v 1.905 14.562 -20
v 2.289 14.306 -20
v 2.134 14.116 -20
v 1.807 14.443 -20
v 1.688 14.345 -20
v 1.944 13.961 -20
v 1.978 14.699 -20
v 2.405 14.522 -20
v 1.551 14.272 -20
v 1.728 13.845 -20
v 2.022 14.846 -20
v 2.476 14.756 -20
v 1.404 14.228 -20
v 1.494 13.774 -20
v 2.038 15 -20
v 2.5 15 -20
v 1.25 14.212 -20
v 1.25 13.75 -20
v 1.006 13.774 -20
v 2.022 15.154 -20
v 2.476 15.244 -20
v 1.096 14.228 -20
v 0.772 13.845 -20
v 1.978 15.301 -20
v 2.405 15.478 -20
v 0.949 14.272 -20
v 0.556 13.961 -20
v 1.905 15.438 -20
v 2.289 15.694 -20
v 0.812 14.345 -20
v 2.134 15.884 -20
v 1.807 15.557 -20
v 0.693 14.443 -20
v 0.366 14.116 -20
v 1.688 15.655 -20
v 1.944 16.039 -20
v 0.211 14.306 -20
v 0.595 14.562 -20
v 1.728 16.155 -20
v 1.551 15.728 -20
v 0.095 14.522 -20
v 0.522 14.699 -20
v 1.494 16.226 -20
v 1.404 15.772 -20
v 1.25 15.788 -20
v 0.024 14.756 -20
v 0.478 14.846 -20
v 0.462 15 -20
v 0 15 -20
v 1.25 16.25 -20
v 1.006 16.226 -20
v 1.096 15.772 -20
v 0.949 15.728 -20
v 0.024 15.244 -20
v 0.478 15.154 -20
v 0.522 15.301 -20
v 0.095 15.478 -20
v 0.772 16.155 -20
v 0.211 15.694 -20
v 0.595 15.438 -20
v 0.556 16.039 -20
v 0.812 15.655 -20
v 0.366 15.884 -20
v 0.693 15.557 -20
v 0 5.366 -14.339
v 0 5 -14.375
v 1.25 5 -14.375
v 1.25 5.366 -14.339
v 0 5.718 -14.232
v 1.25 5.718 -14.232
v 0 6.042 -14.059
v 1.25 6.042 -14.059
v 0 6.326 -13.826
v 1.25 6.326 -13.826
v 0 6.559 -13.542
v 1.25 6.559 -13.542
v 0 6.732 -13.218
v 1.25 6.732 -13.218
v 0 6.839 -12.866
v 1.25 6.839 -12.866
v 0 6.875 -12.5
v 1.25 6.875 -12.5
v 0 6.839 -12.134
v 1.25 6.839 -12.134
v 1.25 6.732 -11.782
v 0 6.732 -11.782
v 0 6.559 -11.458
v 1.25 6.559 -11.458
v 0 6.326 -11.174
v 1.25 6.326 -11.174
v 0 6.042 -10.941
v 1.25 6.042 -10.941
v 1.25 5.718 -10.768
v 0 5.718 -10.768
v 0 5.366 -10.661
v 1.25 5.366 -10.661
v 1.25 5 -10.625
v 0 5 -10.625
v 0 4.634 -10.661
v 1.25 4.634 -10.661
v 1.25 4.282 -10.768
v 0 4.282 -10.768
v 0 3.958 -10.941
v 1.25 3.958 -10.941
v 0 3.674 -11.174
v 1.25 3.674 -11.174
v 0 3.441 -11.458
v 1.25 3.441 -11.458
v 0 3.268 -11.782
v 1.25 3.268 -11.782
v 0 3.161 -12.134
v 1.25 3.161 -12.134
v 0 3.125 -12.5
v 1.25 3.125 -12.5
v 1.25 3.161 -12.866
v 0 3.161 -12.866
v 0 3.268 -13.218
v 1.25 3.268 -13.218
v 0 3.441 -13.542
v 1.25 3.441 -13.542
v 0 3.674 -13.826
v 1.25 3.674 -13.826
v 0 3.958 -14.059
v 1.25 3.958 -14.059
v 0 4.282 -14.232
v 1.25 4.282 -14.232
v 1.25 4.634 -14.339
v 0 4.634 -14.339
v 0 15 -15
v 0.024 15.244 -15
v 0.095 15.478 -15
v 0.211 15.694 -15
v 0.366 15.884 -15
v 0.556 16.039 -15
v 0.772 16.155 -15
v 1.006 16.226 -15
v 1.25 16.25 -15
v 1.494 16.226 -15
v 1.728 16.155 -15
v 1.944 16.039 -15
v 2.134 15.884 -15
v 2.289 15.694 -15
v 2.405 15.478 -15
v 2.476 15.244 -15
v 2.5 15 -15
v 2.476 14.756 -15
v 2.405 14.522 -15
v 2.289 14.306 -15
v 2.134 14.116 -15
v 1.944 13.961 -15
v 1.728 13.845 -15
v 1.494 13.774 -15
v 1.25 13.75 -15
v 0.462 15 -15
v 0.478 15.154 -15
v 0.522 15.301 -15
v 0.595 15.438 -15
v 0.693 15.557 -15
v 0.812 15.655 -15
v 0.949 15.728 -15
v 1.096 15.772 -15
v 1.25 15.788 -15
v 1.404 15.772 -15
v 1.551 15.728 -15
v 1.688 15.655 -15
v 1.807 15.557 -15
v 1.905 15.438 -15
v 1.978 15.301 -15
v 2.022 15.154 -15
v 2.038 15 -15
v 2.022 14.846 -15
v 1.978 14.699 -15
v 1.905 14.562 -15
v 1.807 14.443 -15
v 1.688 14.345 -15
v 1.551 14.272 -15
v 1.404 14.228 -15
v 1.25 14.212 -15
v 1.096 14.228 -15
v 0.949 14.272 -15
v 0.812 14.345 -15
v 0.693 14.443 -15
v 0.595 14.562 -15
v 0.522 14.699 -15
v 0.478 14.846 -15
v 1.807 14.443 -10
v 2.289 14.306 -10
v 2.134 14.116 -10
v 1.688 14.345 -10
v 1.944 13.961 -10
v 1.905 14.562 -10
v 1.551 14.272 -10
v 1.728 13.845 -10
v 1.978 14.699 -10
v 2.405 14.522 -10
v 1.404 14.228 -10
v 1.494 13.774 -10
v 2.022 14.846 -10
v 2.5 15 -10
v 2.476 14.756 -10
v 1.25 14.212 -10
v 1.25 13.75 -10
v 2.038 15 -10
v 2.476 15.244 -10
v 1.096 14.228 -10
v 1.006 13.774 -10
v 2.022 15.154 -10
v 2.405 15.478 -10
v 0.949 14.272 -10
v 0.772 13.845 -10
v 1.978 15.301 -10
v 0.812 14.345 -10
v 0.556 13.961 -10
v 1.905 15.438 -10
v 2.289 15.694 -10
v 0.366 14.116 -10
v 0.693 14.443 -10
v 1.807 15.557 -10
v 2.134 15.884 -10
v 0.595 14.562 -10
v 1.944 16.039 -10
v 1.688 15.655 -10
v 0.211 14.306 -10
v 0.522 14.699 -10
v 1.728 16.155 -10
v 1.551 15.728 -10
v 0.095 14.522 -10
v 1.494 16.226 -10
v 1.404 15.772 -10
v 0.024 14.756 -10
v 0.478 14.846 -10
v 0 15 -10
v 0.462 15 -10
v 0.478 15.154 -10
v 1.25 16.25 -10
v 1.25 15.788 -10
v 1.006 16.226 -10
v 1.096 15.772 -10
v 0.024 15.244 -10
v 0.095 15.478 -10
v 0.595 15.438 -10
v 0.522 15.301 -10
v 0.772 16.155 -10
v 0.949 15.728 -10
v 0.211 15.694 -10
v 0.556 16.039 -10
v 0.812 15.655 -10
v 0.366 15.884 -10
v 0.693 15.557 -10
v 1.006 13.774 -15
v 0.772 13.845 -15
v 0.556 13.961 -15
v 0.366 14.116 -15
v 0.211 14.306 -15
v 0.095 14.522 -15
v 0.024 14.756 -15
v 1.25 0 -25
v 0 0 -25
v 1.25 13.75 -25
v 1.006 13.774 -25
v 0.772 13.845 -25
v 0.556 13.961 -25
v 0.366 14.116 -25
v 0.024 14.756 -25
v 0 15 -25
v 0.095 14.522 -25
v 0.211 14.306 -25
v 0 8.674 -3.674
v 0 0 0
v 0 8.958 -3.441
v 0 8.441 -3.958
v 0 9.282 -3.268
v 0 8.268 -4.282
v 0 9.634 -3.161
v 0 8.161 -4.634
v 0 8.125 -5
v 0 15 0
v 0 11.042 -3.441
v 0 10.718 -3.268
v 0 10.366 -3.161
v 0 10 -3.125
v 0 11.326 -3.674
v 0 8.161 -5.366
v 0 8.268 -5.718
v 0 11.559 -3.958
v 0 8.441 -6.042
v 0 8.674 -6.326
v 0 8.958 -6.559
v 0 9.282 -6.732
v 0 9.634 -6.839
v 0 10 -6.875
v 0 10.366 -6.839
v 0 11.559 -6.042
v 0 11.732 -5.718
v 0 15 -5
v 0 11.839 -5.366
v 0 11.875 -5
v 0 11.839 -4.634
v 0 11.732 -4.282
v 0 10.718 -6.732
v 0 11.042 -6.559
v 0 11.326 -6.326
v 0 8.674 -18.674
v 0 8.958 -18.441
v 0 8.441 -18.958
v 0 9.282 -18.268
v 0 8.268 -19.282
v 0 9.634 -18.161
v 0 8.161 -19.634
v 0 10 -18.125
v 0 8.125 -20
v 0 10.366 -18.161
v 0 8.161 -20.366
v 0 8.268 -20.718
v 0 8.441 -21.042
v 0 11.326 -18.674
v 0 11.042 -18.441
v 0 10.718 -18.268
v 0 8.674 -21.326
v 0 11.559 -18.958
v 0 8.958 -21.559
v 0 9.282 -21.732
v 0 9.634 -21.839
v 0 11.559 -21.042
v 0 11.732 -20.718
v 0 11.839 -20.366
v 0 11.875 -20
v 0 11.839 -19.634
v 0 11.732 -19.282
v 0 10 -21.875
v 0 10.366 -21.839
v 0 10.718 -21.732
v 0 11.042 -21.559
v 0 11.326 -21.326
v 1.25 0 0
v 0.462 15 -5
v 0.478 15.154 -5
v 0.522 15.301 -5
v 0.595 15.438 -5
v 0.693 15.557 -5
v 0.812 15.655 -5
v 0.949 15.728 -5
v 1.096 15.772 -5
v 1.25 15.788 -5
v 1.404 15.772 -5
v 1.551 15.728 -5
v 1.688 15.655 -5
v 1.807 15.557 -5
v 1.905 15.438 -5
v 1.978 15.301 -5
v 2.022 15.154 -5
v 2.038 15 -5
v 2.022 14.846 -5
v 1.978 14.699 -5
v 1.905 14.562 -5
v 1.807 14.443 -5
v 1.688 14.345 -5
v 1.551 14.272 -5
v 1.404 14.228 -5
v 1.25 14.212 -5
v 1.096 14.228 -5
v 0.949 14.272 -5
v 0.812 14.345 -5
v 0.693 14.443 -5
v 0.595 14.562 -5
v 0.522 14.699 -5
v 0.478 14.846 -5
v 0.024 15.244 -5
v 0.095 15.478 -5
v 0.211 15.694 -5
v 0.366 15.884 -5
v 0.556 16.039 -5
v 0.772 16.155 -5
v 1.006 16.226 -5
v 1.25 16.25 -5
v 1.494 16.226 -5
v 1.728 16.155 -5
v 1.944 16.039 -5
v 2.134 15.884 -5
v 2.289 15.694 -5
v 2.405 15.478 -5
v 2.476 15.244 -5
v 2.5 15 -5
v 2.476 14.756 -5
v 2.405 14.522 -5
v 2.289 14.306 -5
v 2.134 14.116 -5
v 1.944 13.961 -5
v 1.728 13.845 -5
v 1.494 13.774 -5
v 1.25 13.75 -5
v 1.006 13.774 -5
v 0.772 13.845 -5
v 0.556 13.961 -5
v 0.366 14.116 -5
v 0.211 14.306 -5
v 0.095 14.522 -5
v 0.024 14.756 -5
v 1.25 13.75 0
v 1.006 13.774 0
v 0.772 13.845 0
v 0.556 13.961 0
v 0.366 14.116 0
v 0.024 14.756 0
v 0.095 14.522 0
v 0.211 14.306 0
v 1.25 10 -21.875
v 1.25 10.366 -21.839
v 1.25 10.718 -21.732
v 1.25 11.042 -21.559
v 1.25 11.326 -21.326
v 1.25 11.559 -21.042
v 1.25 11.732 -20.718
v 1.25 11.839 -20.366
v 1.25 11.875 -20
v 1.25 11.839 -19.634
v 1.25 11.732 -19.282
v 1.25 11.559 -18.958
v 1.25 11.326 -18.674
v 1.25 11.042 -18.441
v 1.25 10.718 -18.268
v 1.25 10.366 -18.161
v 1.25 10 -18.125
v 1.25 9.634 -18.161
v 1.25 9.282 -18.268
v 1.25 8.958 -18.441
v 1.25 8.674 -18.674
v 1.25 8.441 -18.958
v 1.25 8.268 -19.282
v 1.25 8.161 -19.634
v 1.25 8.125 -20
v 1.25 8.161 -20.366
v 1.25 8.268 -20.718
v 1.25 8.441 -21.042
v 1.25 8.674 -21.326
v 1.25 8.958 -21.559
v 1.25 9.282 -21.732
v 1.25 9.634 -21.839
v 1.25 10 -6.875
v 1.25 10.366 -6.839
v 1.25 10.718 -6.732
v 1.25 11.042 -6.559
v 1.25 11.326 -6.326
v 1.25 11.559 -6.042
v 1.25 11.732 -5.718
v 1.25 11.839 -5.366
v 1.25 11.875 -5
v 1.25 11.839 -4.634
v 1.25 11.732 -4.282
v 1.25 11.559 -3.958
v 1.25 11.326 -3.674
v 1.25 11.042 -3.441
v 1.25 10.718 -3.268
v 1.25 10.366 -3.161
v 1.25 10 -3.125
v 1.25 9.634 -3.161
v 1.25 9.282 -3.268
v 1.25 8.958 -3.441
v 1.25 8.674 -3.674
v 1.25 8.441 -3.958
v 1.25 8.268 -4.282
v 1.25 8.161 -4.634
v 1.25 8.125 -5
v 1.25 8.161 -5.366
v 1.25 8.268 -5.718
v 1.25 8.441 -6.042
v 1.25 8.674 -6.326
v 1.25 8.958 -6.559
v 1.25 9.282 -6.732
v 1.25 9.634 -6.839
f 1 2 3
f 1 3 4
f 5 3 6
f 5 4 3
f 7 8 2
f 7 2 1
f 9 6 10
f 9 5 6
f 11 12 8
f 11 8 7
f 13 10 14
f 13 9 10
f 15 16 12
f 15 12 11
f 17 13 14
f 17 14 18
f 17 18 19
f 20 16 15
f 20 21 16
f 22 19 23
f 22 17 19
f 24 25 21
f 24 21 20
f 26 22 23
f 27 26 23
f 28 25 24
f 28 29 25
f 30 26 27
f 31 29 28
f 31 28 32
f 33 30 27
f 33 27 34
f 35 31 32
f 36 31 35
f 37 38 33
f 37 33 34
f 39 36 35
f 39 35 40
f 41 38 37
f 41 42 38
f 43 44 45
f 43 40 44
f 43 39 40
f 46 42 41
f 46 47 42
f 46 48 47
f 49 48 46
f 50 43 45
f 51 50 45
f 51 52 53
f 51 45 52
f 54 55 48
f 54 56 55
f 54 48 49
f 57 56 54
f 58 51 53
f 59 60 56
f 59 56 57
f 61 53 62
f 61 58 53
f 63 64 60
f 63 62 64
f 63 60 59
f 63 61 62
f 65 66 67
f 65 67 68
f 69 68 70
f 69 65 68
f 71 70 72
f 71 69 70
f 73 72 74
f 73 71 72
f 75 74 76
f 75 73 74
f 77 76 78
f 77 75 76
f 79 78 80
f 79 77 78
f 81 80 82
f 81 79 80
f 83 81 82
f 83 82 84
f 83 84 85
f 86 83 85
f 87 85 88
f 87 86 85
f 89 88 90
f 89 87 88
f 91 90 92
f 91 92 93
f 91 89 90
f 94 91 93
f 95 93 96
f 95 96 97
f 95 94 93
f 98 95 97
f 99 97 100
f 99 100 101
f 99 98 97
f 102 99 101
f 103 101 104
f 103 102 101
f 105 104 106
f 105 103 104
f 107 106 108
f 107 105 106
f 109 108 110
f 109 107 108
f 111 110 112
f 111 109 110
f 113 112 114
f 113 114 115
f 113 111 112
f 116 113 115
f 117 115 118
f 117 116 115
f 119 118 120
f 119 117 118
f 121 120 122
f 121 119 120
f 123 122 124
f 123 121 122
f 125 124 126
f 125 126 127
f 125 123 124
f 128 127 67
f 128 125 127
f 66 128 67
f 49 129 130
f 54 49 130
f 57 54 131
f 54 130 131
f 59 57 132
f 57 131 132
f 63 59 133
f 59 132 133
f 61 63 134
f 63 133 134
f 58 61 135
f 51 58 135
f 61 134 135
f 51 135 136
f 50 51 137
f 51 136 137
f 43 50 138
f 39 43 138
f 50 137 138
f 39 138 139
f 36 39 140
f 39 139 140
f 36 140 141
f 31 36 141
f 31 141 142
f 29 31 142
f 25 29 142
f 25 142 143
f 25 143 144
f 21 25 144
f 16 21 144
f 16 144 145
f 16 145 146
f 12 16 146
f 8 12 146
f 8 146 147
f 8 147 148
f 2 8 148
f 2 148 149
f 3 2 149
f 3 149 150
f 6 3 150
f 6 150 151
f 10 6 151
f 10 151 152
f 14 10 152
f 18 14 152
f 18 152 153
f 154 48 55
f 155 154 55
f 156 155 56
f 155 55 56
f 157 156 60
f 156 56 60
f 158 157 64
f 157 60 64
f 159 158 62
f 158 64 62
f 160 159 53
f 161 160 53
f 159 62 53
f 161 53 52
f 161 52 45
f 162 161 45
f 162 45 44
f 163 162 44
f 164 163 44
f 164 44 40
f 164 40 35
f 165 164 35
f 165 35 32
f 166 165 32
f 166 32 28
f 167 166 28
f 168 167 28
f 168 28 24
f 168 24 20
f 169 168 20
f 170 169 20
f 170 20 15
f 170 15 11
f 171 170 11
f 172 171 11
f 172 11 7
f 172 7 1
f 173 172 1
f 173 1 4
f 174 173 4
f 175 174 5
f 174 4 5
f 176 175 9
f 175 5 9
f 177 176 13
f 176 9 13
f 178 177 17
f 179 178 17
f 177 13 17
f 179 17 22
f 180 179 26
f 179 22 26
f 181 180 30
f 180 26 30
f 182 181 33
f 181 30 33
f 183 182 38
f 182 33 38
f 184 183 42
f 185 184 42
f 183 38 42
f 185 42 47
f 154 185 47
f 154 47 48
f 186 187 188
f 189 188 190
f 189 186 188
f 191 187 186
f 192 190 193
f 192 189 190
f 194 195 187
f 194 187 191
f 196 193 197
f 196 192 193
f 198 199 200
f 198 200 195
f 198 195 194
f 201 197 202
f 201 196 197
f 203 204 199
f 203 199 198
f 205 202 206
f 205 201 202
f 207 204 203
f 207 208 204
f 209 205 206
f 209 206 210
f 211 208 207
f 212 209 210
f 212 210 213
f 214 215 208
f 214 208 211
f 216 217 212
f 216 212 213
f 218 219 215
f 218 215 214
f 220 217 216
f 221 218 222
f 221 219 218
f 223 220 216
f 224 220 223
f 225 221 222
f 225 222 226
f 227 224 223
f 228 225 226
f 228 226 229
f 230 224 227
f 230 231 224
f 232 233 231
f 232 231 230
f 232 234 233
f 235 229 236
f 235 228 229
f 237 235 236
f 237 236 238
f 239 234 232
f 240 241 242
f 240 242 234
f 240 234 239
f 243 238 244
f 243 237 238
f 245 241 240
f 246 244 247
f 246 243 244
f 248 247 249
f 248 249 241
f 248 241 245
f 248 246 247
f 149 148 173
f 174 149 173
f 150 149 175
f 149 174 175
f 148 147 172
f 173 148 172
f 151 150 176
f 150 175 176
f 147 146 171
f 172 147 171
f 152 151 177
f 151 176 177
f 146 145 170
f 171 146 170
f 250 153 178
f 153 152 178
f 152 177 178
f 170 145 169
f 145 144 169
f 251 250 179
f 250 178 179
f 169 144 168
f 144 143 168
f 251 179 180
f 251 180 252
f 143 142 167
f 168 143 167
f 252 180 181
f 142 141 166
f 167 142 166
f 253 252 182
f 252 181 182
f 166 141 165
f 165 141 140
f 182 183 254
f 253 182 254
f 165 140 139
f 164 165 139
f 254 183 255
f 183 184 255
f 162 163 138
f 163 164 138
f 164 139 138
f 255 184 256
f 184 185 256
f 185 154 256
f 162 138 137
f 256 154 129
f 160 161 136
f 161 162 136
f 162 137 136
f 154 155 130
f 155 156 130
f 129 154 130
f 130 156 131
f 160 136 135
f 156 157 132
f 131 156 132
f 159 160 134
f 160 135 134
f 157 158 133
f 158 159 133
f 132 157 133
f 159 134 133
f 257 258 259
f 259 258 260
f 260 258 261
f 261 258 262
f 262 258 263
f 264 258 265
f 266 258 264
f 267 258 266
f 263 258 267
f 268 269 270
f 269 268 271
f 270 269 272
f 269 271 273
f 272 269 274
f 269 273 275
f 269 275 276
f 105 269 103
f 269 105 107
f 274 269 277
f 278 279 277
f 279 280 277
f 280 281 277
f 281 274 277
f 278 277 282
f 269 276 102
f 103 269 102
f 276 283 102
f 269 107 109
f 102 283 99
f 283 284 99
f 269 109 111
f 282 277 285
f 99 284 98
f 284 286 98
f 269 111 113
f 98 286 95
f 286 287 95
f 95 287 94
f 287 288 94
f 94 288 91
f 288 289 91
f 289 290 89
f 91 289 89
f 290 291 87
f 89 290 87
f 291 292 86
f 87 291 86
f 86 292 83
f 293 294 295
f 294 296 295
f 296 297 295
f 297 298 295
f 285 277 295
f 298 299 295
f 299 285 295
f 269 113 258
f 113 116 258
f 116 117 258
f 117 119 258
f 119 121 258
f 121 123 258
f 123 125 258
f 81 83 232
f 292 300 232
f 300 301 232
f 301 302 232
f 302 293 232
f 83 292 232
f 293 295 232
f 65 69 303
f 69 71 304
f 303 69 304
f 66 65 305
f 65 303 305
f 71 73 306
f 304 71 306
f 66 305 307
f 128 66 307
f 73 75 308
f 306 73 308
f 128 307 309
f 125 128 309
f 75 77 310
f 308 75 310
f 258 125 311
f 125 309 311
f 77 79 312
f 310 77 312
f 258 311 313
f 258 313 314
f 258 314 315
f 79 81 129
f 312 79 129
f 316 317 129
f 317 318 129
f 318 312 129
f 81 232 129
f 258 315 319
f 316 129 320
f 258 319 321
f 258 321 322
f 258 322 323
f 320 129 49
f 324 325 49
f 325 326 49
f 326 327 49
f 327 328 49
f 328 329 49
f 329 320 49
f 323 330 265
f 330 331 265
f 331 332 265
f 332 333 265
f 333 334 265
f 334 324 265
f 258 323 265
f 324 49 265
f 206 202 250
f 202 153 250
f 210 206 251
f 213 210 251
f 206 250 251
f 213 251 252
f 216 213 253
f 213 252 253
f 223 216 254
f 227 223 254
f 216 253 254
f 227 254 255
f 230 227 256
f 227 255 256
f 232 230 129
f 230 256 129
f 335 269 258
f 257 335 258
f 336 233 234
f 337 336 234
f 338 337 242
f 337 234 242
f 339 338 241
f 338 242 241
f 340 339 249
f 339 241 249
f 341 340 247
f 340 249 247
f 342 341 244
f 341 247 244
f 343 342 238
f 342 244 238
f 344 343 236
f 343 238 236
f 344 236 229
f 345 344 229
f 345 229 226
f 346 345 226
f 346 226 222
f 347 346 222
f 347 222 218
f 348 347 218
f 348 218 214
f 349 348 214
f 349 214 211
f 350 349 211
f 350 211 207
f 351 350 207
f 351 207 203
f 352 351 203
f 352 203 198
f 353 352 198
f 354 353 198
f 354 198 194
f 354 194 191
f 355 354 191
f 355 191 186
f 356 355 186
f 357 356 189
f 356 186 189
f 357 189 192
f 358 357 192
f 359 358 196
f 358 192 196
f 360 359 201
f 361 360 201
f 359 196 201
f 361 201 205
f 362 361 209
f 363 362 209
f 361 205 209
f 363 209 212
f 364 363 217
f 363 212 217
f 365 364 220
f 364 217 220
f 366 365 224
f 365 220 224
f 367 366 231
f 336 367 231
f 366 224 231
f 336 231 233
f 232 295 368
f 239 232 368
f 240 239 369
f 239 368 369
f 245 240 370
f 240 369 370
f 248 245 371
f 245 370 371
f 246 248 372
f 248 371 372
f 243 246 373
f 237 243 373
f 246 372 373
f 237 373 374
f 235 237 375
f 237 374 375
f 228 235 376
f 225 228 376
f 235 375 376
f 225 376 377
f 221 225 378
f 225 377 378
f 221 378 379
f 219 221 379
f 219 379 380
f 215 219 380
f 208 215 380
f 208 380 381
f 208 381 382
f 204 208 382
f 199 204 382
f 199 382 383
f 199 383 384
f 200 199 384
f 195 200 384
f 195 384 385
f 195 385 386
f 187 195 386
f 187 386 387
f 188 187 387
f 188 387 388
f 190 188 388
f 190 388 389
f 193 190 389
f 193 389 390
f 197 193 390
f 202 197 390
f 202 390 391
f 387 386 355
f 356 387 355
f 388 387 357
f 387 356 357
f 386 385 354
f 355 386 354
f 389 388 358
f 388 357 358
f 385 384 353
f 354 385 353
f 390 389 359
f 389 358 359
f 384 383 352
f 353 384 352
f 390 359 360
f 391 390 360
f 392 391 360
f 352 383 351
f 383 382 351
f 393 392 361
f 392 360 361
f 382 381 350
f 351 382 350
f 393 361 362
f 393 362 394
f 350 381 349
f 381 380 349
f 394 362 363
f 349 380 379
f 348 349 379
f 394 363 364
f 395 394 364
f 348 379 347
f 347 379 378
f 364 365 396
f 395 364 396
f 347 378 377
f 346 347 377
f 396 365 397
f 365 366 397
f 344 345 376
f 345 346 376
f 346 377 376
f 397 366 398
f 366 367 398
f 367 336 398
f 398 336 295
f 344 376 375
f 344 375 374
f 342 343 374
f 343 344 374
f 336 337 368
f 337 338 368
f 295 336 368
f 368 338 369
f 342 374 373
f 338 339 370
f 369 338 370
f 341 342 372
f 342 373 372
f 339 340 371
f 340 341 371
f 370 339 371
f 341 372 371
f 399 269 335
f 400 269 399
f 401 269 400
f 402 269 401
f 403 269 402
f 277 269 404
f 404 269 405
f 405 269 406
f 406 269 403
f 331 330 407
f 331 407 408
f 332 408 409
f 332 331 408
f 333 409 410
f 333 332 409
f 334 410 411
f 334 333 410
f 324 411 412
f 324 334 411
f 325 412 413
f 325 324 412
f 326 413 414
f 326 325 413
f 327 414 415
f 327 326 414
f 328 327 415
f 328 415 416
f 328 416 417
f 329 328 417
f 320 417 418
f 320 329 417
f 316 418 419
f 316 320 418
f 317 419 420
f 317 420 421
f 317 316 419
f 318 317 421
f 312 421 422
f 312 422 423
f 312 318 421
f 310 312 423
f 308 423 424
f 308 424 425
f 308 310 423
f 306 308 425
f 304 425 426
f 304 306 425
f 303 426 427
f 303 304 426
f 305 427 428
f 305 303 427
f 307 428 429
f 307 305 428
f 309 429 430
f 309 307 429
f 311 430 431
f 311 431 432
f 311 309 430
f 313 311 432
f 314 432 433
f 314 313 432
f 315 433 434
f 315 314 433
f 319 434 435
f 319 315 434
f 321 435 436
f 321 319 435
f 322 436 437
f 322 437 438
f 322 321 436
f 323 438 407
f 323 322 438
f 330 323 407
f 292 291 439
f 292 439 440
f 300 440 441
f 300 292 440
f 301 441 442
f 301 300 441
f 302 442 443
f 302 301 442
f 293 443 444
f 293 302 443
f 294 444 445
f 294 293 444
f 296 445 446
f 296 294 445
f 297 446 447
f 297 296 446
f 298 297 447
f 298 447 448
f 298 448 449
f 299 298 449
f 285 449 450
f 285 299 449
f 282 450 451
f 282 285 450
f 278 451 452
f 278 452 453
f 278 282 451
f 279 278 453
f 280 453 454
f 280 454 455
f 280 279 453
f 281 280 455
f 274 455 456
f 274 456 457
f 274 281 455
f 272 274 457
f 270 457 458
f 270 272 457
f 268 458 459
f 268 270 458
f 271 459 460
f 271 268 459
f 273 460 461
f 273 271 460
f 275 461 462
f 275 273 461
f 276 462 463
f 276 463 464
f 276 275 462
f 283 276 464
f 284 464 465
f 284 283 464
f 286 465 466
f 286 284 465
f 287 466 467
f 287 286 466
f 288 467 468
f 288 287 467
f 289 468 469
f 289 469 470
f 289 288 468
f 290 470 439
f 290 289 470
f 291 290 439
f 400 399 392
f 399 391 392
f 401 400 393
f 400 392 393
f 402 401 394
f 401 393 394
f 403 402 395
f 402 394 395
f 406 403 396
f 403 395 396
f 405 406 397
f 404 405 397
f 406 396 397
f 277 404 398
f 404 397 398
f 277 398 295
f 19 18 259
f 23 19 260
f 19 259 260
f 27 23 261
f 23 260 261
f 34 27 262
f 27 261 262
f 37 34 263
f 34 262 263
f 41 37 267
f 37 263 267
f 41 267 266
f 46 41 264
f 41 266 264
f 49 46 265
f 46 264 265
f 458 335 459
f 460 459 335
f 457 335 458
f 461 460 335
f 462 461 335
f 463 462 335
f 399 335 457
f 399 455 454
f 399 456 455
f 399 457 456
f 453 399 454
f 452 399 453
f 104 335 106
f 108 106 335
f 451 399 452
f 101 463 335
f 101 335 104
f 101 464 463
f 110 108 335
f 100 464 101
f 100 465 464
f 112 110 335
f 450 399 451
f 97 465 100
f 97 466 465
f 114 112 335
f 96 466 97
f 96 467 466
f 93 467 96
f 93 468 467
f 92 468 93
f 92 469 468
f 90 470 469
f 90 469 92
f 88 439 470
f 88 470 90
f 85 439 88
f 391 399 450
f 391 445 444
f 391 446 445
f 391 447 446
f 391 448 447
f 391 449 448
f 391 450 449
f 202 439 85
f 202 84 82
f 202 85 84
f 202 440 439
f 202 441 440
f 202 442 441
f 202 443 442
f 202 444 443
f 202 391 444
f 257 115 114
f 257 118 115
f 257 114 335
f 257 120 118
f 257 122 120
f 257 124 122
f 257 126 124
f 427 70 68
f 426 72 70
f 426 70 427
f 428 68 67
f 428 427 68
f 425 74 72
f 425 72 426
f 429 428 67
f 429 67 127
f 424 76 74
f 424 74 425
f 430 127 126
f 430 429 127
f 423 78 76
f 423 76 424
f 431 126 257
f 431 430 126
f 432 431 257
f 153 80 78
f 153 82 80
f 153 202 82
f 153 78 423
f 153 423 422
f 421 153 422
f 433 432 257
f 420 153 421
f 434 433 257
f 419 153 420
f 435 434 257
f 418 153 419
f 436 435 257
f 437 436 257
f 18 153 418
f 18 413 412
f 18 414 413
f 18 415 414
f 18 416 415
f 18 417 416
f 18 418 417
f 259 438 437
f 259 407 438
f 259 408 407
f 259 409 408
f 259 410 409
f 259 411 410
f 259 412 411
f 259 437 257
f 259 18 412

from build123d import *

# Parameters (mm, degrees)
SKETCH1_W           = 50
SKETCH1_H           = 30
SKETCH1_R           = 3.75
BOSS_EXTRUDE1_DEPTH = 2.5
BOSS_EXTRUDE2_START = -20
SKETCH3_R           = 2.5
BOSS_EXTRUDE2_DEPTH = 10
LPATTERN1_COUNT     = 2
LPATTERN1_PITCH     = 20
SKETCH5_R           = 1.575
CUT_EXTRUDE1_DEPTH  = 50
SKETCH6_R           = 2.5
CUT_EXTRUDE2_DEPTH  = 10
LPATTERN2_COUNT     = 3
LPATTERN2_PITCH     = 20
ESCALA1_SCALE       = 0.5


with BuildPart() as part:
    # Sketch1 → Boss-Extrude1 (new body)
    with BuildSketch(Plane(origin=(0, 0, 0), x_dir=(0, 0, -1), z_dir=(1, 0, 0))):
        with Locations((25, 15)):
            Rectangle(SKETCH1_W, SKETCH1_H)
        with Locations((40, 20)):
            Circle(SKETCH1_R, mode=Mode.SUBTRACT)
        with Locations((25, 10)):
            Circle(SKETCH1_R, mode=Mode.SUBTRACT)
        with Locations((10, 20)):
            Circle(SKETCH1_R, mode=Mode.SUBTRACT)
    extrude(amount=BOSS_EXTRUDE1_DEPTH)

    # Sketch3 → Boss-Extrude2 (add)
    with BuildSketch(Plane(origin=(0, 0, -50), x_dir=(-1, 0, 0), z_dir=(0, 0, -1)).offset(BOSS_EXTRUDE2_START)):
        with Locations((-2.5, 30)):
            Circle(SKETCH3_R)
    boss_extrude2 = extrude(amount=BOSS_EXTRUDE2_DEPTH)

    # LPattern1: Boss-Extrude2 ×2
    with Locations(*[(0, 0, i * LPATTERN1_PITCH) for i in range(1, LPATTERN1_COUNT)]):
        add(boss_extrude2)

    # Sketch5 → Cut-Extrude1 (cut)
    with BuildSketch(Plane(origin=(0, 0, -50), x_dir=(-1, 0, 0), z_dir=(0, 0, -1))):
        with Locations((-2.5, 30)):
            Circle(SKETCH5_R)
    extrude(amount=-CUT_EXTRUDE1_DEPTH, mode=Mode.SUBTRACT)

    # Sketch6 → Cut-Extrude2 (cut)
    with BuildSketch(Plane(origin=(0, 0, -50), x_dir=(-1, 0, 0), z_dir=(0, 0, -1))):
        with Locations((-2.5, 30)):
            Circle(SKETCH6_R)
    cut_extrude2 = extrude(amount=-CUT_EXTRUDE2_DEPTH, mode=Mode.SUBTRACT)

    # LPattern2: Cut-Extrude2 ×3
    with Locations(*[(0, 0, i * LPATTERN2_PITCH) for i in range(1, LPATTERN2_COUNT)]):
        add(cut_extrude2, mode=Mode.SUBTRACT)


with BuildPart() as part_1:
    # Escala1: scaled about (0, 0, 0)
    add(part.part.scale(ESCALA1_SCALE))


solid = part_1.part
